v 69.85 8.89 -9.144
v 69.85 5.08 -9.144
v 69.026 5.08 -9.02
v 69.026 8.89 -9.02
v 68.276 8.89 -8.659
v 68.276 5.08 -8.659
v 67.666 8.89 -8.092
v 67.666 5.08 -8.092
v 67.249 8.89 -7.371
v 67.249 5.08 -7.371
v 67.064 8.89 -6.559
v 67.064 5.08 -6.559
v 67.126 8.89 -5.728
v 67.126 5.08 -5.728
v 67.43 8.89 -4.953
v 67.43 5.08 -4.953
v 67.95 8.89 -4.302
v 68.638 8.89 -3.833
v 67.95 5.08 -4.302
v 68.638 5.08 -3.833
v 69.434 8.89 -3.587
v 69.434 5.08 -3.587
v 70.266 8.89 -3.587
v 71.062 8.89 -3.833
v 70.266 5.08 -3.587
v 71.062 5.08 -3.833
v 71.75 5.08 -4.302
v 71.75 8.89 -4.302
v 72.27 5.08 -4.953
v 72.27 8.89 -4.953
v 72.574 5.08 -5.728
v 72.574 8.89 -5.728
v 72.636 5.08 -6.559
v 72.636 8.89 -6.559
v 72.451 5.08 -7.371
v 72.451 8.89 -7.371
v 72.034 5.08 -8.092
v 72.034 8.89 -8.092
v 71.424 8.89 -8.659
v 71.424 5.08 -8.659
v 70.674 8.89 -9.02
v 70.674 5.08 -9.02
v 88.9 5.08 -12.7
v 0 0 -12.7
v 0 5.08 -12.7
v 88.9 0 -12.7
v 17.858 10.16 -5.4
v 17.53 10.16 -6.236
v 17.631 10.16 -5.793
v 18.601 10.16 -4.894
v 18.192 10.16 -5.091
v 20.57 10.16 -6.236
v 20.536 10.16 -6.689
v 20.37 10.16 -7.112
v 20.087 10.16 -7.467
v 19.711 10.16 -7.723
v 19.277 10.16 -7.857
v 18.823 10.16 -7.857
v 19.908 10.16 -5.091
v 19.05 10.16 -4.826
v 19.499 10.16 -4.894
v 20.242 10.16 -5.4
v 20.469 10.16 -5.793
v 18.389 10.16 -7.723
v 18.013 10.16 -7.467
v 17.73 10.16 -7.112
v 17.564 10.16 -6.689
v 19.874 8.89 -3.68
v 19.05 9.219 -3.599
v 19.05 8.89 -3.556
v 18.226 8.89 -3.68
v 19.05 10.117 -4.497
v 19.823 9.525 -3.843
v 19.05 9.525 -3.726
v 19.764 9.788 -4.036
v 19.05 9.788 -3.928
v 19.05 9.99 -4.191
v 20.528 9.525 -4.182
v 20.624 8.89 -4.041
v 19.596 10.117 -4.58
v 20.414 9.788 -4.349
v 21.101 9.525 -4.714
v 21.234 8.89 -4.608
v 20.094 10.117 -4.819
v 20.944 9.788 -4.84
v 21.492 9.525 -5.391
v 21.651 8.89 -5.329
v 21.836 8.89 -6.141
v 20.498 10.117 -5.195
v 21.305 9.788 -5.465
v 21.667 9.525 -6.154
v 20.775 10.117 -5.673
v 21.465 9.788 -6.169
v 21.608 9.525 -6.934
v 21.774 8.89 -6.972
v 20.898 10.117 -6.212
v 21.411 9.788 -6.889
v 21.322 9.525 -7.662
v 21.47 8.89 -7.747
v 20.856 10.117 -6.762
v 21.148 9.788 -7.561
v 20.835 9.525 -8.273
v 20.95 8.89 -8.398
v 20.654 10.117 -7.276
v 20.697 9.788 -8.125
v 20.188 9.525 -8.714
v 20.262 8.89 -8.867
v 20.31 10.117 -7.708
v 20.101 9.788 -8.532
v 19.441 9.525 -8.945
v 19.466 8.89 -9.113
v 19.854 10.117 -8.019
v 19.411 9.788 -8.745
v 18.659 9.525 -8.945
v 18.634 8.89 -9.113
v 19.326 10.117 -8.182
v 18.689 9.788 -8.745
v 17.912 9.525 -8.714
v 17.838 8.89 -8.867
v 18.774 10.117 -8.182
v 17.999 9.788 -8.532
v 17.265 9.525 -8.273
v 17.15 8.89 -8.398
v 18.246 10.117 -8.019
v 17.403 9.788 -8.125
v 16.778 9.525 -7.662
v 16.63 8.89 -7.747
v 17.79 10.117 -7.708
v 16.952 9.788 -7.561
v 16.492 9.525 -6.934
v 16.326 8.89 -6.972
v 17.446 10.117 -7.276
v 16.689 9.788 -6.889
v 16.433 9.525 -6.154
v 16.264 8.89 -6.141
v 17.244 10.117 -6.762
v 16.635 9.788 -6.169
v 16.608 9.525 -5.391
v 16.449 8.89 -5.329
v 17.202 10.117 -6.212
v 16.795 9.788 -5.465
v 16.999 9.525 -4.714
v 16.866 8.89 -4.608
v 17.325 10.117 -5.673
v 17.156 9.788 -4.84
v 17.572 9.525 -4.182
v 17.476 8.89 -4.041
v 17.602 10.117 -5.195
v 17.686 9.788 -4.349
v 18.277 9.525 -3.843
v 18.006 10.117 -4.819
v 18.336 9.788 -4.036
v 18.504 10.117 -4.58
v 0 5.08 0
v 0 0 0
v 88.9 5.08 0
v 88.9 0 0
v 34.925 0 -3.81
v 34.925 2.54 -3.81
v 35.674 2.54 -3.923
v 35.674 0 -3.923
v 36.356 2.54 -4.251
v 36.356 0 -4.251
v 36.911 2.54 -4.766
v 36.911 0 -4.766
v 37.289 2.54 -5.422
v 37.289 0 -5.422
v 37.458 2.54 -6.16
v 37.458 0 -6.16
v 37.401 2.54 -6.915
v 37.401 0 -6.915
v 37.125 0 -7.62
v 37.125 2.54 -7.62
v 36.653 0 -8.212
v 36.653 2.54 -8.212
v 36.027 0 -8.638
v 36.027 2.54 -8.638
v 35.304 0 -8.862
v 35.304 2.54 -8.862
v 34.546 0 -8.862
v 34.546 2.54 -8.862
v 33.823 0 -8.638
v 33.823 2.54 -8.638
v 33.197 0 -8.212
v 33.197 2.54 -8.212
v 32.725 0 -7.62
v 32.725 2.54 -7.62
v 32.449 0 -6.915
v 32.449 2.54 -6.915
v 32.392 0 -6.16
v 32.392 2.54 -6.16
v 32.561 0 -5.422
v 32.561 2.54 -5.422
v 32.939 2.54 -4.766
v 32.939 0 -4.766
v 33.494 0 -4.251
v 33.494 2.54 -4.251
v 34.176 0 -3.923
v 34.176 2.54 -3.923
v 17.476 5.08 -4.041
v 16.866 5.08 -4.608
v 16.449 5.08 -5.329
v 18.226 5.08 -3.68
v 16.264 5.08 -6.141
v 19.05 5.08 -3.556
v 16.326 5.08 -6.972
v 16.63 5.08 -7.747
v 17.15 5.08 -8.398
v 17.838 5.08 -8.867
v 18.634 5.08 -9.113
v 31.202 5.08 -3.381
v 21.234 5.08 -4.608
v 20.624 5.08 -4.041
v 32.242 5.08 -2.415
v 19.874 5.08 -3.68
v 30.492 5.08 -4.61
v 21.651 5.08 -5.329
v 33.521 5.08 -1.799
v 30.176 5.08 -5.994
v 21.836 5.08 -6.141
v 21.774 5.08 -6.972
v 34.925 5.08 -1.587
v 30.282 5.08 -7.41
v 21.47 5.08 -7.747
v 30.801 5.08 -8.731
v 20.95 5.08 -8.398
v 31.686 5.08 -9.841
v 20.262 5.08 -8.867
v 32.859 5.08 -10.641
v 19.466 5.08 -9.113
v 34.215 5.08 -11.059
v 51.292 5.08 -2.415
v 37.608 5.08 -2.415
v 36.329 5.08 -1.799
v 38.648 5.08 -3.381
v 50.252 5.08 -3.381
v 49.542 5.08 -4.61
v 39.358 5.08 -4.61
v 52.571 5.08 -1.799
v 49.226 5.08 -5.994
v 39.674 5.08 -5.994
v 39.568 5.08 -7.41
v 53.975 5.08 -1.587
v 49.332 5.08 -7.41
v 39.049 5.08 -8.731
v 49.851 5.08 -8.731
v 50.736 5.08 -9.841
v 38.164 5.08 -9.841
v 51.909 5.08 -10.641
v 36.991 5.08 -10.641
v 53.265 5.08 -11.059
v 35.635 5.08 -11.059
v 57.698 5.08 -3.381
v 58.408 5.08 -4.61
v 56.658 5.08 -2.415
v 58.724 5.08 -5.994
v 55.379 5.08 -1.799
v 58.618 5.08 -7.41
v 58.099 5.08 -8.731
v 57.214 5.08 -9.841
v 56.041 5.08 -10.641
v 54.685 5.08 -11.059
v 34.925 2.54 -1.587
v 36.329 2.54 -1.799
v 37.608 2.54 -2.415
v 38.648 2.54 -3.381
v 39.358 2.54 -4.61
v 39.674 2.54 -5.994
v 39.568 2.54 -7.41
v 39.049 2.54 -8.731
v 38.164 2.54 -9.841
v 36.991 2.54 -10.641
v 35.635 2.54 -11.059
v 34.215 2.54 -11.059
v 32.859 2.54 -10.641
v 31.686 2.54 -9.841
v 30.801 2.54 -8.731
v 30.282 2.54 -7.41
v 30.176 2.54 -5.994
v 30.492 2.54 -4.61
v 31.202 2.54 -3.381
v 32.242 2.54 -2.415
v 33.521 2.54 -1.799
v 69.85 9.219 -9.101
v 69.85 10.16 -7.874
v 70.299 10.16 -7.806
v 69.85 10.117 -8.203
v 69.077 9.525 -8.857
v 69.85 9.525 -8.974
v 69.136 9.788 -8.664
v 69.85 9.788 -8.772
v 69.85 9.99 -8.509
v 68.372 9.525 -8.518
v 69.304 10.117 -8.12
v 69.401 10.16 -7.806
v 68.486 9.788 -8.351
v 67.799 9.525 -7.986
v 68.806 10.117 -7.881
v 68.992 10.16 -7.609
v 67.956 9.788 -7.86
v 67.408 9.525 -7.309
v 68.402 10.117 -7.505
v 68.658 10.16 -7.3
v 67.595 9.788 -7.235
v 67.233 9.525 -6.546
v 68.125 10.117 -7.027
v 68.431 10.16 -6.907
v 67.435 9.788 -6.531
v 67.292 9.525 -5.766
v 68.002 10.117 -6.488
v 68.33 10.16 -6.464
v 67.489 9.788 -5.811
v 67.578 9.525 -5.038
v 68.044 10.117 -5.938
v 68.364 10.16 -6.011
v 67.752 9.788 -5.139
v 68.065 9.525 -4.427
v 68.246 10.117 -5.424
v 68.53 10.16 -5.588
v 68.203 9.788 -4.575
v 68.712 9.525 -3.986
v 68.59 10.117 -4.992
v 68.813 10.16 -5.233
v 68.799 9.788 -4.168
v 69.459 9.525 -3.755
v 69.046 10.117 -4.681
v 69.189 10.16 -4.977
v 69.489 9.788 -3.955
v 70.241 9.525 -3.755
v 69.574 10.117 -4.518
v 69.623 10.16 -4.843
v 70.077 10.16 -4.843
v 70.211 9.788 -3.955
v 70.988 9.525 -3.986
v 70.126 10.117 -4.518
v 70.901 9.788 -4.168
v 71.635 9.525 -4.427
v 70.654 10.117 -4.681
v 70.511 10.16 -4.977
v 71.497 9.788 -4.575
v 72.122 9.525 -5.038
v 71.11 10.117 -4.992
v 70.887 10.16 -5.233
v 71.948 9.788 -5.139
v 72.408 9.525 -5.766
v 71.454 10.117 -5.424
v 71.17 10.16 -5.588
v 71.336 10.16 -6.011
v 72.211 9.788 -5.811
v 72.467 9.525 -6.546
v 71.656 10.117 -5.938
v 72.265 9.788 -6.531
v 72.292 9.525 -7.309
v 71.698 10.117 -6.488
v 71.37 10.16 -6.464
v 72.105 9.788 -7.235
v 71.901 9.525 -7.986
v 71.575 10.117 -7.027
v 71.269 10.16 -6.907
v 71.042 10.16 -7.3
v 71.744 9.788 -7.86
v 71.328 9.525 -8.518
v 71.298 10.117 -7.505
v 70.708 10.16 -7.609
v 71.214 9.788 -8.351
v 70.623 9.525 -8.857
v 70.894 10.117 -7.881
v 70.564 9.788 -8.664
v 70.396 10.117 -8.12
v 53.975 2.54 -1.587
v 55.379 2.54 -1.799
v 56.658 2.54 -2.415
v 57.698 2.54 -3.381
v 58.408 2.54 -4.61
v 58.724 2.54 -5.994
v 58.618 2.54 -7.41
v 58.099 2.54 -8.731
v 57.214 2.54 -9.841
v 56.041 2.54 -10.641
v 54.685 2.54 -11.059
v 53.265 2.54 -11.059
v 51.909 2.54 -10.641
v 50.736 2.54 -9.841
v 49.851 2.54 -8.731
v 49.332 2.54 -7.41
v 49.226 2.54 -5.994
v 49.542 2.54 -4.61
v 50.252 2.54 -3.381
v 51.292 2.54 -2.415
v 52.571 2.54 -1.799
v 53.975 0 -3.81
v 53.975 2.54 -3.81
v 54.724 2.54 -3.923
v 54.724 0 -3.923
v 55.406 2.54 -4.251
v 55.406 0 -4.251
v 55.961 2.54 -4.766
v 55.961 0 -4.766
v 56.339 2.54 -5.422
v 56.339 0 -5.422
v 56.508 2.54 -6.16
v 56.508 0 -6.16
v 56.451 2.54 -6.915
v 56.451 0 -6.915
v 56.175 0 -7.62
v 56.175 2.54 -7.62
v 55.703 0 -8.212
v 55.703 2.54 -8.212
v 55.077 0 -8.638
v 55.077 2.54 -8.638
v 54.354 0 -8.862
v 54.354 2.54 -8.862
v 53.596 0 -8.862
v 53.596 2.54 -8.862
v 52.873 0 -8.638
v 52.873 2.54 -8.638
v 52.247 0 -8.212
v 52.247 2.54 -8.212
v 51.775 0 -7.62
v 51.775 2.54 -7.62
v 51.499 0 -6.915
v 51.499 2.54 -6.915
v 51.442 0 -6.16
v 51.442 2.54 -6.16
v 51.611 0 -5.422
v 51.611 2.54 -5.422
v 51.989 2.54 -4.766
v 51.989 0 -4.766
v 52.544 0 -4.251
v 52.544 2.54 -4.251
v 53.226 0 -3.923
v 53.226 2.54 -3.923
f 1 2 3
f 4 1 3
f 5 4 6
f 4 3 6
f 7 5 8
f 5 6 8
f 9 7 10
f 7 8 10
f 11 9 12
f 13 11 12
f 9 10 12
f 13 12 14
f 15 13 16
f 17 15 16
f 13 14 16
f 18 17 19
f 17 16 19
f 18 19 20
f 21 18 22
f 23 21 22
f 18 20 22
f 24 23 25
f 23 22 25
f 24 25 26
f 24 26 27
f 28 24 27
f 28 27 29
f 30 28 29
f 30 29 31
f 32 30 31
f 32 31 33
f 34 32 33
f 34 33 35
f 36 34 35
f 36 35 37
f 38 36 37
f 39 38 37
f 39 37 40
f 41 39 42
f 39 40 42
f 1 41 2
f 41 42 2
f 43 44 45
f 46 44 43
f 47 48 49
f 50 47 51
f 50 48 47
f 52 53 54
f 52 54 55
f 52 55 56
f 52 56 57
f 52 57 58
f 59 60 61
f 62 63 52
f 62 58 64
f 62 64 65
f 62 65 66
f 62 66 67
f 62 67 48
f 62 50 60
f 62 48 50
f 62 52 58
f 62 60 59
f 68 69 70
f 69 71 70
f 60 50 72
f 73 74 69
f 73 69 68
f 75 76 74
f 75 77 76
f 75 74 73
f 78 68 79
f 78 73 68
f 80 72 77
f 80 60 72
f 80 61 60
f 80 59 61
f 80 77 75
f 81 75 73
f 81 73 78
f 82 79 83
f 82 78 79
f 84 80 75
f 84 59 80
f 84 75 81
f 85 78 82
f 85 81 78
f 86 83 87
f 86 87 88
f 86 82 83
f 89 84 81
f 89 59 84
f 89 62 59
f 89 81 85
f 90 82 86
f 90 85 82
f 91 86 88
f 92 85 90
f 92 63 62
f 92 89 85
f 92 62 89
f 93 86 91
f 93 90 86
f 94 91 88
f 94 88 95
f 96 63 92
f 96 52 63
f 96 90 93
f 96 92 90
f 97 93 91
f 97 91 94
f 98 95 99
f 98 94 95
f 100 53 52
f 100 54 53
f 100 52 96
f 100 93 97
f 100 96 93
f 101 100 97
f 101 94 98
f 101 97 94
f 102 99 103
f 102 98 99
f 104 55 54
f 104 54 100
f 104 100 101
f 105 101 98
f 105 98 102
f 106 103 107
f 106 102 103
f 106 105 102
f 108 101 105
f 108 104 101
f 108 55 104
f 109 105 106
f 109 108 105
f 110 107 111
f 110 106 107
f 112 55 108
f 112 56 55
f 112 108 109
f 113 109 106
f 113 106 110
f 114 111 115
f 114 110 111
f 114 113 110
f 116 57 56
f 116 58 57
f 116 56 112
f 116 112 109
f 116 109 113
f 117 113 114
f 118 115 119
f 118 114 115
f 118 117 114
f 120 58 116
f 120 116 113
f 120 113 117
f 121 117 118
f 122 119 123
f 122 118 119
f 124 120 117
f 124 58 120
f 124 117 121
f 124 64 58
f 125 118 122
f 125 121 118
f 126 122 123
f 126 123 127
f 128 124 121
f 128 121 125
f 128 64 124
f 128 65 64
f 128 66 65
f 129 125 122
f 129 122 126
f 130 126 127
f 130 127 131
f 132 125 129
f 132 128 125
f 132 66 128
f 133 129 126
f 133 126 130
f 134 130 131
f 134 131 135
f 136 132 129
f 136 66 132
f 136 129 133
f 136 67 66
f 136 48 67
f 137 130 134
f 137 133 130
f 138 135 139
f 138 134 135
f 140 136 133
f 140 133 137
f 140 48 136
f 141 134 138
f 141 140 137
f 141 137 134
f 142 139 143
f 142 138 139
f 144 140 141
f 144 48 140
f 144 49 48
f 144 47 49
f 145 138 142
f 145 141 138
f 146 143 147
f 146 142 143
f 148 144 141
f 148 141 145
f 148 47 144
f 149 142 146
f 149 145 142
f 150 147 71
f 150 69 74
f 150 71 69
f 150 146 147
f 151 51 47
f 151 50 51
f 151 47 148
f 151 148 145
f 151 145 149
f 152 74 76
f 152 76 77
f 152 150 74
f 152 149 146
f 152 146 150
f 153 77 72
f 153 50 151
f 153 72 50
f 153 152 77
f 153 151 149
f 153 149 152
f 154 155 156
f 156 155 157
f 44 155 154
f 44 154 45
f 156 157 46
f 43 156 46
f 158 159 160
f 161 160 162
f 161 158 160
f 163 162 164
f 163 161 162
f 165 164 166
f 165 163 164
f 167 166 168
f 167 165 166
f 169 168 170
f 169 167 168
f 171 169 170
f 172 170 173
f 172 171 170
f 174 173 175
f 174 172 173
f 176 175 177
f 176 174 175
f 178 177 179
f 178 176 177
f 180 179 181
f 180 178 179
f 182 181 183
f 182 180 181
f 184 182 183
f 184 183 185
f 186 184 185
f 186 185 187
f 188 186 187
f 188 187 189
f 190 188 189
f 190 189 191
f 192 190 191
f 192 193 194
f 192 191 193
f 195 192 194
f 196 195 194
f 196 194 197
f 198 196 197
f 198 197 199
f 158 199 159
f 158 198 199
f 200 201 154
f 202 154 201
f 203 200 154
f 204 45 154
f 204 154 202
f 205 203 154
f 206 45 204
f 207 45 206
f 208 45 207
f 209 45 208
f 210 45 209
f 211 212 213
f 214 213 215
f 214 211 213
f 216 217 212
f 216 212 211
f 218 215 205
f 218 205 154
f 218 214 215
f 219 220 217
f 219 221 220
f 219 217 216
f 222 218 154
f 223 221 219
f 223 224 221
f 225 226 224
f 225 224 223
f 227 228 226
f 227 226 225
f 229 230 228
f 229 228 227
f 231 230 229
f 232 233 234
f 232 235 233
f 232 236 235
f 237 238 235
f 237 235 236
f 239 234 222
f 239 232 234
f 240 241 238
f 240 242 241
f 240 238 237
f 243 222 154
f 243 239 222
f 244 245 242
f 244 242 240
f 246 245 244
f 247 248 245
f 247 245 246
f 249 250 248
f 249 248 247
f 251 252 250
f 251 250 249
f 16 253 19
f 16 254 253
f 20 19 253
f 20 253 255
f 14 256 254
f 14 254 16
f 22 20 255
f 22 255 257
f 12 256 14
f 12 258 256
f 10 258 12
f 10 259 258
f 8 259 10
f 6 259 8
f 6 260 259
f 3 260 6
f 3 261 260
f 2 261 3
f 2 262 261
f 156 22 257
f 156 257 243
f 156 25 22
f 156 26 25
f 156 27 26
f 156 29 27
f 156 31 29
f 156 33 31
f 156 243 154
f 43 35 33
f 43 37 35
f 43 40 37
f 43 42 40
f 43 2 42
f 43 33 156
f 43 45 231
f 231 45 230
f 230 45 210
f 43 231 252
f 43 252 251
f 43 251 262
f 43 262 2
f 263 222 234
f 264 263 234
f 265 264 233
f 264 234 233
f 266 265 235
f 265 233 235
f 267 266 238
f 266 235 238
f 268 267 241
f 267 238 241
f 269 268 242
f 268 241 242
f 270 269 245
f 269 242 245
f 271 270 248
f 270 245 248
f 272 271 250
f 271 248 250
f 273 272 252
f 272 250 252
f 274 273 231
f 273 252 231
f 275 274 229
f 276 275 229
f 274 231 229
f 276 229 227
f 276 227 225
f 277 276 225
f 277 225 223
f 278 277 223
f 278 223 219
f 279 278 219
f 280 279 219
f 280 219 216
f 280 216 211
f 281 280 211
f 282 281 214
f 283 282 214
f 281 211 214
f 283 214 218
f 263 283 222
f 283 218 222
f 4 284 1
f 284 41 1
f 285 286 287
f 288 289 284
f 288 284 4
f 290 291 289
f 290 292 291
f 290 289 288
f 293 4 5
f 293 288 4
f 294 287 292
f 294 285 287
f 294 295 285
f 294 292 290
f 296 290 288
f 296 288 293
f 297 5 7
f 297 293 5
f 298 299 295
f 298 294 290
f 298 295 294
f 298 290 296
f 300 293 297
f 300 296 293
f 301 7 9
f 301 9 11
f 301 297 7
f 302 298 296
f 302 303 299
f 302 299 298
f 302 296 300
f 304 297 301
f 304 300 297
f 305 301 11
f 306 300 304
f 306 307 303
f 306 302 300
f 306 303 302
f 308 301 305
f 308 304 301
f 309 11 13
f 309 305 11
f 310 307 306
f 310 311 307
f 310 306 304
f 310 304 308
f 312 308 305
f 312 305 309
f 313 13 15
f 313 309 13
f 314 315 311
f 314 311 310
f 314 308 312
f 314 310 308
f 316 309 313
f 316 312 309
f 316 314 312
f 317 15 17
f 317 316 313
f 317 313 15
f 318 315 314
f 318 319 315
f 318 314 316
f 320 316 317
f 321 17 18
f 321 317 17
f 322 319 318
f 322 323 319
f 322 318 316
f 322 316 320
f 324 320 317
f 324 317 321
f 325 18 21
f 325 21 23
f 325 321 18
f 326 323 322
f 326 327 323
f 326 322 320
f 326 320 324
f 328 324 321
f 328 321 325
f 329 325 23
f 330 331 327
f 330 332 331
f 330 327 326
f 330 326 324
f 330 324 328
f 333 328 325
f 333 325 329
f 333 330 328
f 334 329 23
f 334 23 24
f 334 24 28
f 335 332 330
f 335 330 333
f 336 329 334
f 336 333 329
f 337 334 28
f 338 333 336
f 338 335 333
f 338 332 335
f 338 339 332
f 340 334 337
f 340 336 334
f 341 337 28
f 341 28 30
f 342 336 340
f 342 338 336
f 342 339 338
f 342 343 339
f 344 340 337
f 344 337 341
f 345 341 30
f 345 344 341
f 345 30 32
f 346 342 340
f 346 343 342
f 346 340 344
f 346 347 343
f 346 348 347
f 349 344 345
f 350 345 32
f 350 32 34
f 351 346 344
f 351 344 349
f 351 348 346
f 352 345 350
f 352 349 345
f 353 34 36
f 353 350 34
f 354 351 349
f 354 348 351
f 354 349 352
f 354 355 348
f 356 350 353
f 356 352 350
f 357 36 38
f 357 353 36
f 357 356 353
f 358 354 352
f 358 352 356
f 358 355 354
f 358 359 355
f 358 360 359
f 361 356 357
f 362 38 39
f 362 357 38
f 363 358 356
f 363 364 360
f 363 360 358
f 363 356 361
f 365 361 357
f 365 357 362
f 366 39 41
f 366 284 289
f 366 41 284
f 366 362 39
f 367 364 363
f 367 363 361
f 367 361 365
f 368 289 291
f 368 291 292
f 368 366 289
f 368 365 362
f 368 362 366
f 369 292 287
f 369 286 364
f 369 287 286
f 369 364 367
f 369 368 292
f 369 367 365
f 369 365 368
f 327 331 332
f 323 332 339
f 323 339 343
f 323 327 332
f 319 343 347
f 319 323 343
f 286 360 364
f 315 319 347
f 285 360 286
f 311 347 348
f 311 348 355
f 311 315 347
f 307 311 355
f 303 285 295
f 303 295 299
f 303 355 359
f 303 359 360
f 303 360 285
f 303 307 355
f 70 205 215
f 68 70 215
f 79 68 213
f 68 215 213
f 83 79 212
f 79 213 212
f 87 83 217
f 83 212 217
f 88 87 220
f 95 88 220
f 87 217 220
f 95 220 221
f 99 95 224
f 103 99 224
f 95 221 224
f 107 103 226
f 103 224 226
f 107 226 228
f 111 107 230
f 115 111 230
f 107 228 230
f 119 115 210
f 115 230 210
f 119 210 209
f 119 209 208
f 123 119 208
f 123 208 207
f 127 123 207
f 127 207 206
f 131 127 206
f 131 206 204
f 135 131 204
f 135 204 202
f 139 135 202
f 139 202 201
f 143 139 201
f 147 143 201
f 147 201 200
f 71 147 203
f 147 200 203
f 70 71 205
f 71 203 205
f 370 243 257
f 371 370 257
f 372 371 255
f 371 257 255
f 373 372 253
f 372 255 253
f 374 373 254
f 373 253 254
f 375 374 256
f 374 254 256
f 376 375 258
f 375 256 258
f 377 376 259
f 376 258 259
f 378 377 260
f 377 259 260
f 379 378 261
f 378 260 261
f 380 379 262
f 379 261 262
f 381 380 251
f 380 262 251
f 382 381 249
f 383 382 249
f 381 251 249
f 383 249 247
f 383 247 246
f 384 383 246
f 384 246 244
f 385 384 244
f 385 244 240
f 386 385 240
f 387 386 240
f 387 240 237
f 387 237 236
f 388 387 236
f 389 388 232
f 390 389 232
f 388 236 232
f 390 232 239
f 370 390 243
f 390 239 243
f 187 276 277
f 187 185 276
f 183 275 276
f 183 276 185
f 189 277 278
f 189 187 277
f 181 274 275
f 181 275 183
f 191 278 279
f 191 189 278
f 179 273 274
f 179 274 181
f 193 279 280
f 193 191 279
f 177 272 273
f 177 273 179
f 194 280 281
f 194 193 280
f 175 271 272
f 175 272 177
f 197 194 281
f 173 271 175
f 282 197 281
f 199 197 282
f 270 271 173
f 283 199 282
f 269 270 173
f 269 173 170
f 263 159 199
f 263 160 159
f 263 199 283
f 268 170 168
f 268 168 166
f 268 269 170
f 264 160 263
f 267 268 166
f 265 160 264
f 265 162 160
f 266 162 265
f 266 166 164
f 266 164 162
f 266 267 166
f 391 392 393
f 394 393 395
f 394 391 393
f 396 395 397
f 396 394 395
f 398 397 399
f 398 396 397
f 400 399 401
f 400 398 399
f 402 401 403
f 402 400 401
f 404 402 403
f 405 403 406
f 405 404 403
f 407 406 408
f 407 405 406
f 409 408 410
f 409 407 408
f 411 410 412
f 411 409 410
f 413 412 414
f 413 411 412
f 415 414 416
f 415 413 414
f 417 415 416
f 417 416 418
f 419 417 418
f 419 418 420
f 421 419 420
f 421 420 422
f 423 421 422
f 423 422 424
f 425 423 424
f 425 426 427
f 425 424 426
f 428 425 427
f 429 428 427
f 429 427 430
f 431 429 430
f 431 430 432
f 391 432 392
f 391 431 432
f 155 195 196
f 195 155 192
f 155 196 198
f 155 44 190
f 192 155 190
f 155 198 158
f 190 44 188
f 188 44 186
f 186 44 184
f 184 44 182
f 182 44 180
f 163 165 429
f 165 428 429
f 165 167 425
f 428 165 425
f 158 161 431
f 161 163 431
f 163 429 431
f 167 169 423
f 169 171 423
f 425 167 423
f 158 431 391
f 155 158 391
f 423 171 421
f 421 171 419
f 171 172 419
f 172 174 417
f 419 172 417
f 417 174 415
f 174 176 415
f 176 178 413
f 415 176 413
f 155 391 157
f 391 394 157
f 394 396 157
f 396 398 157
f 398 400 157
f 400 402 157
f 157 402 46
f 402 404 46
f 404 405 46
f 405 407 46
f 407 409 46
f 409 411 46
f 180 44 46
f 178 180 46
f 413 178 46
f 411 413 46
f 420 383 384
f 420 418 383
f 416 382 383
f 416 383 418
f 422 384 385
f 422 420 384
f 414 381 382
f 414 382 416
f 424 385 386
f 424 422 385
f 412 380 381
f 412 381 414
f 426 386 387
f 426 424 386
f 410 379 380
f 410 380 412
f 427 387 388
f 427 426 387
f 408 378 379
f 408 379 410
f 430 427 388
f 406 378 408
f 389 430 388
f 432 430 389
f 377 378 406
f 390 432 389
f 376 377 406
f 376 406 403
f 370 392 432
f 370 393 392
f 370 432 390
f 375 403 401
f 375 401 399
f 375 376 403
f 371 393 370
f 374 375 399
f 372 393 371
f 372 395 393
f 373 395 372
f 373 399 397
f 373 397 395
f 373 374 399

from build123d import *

# Parameters (mm, degrees)
SKETCH1_W           = 88.9
SKETCH1_H           = 12.7
SKETCH1_R           = 2.54
BOSS_EXTRUDE2_DEPTH = 5.08
SKETCH2_R           = 2.794
BOSS_EXTRUDE3_DEPTH = 5.08
FILLET1_R           = 1.27
SKETCH3_R           = 4.7625
CUT_EXTRUDE1_DEPTH  = 2.54


with BuildPart() as part:
    # Sketch1 → Boss-Extrude2 (new body)
    with BuildSketch(Plane(origin=(0, 0, 0), x_dir=(1, 0, 0), z_dir=(0, 1, 0))):
        with Locations((44.45, 6.35)):
            Rectangle(SKETCH1_W, SKETCH1_H)
        with Locations(Location((34.925, 6.35, 0), (0, 0, 270))):
            Circle(SKETCH1_R, mode=Mode.SUBTRACT)
        with Locations(Location((53.975, 6.35, 0), (0, 0, 270))):
            Circle(SKETCH1_R, mode=Mode.SUBTRACT)
    extrude(amount=BOSS_EXTRUDE2_DEPTH)

    # Sketch2 → Boss-Extrude3 (add)
    with BuildSketch(Plane(origin=(0, 5.08, 0), x_dir=(1, 0, 0), z_dir=(0, 1, 0))):
        with Locations(Location((19.05, 6.35, 0), (0, 0, 270))):
            Circle(SKETCH2_R)
        with Locations(Location((69.85, 6.35, 0), (0, 0, 90))):
            Circle(SKETCH2_R)
    extrude(amount=BOSS_EXTRUDE3_DEPTH)

    # Fillet1
    fillet1_edges = [part.edges().sort_by_distance(p)[0] for p in [
        (19.05, 10.16, -9.144),
        (69.85, 10.16, -3.556),
    ]]
    fillet(fillet1_edges, radius=FILLET1_R)

    # Sketch3 → Cut-Extrude1 (cut)
    with BuildSketch(Plane(origin=(0, 5.08, 0), x_dir=(1, 0, 0), z_dir=(0, 1, 0))):
        with Locations(Location((34.925, 6.35, 0), (0, 0, 270))):
            Circle(SKETCH3_R)
        with Locations(Location((53.975, 6.35, 0), (0, 0, 270))):
            Circle(SKETCH3_R)
    extrude(amount=-CUT_EXTRUDE1_DEPTH, mode=Mode.SUBTRACT)


solid = part.part
